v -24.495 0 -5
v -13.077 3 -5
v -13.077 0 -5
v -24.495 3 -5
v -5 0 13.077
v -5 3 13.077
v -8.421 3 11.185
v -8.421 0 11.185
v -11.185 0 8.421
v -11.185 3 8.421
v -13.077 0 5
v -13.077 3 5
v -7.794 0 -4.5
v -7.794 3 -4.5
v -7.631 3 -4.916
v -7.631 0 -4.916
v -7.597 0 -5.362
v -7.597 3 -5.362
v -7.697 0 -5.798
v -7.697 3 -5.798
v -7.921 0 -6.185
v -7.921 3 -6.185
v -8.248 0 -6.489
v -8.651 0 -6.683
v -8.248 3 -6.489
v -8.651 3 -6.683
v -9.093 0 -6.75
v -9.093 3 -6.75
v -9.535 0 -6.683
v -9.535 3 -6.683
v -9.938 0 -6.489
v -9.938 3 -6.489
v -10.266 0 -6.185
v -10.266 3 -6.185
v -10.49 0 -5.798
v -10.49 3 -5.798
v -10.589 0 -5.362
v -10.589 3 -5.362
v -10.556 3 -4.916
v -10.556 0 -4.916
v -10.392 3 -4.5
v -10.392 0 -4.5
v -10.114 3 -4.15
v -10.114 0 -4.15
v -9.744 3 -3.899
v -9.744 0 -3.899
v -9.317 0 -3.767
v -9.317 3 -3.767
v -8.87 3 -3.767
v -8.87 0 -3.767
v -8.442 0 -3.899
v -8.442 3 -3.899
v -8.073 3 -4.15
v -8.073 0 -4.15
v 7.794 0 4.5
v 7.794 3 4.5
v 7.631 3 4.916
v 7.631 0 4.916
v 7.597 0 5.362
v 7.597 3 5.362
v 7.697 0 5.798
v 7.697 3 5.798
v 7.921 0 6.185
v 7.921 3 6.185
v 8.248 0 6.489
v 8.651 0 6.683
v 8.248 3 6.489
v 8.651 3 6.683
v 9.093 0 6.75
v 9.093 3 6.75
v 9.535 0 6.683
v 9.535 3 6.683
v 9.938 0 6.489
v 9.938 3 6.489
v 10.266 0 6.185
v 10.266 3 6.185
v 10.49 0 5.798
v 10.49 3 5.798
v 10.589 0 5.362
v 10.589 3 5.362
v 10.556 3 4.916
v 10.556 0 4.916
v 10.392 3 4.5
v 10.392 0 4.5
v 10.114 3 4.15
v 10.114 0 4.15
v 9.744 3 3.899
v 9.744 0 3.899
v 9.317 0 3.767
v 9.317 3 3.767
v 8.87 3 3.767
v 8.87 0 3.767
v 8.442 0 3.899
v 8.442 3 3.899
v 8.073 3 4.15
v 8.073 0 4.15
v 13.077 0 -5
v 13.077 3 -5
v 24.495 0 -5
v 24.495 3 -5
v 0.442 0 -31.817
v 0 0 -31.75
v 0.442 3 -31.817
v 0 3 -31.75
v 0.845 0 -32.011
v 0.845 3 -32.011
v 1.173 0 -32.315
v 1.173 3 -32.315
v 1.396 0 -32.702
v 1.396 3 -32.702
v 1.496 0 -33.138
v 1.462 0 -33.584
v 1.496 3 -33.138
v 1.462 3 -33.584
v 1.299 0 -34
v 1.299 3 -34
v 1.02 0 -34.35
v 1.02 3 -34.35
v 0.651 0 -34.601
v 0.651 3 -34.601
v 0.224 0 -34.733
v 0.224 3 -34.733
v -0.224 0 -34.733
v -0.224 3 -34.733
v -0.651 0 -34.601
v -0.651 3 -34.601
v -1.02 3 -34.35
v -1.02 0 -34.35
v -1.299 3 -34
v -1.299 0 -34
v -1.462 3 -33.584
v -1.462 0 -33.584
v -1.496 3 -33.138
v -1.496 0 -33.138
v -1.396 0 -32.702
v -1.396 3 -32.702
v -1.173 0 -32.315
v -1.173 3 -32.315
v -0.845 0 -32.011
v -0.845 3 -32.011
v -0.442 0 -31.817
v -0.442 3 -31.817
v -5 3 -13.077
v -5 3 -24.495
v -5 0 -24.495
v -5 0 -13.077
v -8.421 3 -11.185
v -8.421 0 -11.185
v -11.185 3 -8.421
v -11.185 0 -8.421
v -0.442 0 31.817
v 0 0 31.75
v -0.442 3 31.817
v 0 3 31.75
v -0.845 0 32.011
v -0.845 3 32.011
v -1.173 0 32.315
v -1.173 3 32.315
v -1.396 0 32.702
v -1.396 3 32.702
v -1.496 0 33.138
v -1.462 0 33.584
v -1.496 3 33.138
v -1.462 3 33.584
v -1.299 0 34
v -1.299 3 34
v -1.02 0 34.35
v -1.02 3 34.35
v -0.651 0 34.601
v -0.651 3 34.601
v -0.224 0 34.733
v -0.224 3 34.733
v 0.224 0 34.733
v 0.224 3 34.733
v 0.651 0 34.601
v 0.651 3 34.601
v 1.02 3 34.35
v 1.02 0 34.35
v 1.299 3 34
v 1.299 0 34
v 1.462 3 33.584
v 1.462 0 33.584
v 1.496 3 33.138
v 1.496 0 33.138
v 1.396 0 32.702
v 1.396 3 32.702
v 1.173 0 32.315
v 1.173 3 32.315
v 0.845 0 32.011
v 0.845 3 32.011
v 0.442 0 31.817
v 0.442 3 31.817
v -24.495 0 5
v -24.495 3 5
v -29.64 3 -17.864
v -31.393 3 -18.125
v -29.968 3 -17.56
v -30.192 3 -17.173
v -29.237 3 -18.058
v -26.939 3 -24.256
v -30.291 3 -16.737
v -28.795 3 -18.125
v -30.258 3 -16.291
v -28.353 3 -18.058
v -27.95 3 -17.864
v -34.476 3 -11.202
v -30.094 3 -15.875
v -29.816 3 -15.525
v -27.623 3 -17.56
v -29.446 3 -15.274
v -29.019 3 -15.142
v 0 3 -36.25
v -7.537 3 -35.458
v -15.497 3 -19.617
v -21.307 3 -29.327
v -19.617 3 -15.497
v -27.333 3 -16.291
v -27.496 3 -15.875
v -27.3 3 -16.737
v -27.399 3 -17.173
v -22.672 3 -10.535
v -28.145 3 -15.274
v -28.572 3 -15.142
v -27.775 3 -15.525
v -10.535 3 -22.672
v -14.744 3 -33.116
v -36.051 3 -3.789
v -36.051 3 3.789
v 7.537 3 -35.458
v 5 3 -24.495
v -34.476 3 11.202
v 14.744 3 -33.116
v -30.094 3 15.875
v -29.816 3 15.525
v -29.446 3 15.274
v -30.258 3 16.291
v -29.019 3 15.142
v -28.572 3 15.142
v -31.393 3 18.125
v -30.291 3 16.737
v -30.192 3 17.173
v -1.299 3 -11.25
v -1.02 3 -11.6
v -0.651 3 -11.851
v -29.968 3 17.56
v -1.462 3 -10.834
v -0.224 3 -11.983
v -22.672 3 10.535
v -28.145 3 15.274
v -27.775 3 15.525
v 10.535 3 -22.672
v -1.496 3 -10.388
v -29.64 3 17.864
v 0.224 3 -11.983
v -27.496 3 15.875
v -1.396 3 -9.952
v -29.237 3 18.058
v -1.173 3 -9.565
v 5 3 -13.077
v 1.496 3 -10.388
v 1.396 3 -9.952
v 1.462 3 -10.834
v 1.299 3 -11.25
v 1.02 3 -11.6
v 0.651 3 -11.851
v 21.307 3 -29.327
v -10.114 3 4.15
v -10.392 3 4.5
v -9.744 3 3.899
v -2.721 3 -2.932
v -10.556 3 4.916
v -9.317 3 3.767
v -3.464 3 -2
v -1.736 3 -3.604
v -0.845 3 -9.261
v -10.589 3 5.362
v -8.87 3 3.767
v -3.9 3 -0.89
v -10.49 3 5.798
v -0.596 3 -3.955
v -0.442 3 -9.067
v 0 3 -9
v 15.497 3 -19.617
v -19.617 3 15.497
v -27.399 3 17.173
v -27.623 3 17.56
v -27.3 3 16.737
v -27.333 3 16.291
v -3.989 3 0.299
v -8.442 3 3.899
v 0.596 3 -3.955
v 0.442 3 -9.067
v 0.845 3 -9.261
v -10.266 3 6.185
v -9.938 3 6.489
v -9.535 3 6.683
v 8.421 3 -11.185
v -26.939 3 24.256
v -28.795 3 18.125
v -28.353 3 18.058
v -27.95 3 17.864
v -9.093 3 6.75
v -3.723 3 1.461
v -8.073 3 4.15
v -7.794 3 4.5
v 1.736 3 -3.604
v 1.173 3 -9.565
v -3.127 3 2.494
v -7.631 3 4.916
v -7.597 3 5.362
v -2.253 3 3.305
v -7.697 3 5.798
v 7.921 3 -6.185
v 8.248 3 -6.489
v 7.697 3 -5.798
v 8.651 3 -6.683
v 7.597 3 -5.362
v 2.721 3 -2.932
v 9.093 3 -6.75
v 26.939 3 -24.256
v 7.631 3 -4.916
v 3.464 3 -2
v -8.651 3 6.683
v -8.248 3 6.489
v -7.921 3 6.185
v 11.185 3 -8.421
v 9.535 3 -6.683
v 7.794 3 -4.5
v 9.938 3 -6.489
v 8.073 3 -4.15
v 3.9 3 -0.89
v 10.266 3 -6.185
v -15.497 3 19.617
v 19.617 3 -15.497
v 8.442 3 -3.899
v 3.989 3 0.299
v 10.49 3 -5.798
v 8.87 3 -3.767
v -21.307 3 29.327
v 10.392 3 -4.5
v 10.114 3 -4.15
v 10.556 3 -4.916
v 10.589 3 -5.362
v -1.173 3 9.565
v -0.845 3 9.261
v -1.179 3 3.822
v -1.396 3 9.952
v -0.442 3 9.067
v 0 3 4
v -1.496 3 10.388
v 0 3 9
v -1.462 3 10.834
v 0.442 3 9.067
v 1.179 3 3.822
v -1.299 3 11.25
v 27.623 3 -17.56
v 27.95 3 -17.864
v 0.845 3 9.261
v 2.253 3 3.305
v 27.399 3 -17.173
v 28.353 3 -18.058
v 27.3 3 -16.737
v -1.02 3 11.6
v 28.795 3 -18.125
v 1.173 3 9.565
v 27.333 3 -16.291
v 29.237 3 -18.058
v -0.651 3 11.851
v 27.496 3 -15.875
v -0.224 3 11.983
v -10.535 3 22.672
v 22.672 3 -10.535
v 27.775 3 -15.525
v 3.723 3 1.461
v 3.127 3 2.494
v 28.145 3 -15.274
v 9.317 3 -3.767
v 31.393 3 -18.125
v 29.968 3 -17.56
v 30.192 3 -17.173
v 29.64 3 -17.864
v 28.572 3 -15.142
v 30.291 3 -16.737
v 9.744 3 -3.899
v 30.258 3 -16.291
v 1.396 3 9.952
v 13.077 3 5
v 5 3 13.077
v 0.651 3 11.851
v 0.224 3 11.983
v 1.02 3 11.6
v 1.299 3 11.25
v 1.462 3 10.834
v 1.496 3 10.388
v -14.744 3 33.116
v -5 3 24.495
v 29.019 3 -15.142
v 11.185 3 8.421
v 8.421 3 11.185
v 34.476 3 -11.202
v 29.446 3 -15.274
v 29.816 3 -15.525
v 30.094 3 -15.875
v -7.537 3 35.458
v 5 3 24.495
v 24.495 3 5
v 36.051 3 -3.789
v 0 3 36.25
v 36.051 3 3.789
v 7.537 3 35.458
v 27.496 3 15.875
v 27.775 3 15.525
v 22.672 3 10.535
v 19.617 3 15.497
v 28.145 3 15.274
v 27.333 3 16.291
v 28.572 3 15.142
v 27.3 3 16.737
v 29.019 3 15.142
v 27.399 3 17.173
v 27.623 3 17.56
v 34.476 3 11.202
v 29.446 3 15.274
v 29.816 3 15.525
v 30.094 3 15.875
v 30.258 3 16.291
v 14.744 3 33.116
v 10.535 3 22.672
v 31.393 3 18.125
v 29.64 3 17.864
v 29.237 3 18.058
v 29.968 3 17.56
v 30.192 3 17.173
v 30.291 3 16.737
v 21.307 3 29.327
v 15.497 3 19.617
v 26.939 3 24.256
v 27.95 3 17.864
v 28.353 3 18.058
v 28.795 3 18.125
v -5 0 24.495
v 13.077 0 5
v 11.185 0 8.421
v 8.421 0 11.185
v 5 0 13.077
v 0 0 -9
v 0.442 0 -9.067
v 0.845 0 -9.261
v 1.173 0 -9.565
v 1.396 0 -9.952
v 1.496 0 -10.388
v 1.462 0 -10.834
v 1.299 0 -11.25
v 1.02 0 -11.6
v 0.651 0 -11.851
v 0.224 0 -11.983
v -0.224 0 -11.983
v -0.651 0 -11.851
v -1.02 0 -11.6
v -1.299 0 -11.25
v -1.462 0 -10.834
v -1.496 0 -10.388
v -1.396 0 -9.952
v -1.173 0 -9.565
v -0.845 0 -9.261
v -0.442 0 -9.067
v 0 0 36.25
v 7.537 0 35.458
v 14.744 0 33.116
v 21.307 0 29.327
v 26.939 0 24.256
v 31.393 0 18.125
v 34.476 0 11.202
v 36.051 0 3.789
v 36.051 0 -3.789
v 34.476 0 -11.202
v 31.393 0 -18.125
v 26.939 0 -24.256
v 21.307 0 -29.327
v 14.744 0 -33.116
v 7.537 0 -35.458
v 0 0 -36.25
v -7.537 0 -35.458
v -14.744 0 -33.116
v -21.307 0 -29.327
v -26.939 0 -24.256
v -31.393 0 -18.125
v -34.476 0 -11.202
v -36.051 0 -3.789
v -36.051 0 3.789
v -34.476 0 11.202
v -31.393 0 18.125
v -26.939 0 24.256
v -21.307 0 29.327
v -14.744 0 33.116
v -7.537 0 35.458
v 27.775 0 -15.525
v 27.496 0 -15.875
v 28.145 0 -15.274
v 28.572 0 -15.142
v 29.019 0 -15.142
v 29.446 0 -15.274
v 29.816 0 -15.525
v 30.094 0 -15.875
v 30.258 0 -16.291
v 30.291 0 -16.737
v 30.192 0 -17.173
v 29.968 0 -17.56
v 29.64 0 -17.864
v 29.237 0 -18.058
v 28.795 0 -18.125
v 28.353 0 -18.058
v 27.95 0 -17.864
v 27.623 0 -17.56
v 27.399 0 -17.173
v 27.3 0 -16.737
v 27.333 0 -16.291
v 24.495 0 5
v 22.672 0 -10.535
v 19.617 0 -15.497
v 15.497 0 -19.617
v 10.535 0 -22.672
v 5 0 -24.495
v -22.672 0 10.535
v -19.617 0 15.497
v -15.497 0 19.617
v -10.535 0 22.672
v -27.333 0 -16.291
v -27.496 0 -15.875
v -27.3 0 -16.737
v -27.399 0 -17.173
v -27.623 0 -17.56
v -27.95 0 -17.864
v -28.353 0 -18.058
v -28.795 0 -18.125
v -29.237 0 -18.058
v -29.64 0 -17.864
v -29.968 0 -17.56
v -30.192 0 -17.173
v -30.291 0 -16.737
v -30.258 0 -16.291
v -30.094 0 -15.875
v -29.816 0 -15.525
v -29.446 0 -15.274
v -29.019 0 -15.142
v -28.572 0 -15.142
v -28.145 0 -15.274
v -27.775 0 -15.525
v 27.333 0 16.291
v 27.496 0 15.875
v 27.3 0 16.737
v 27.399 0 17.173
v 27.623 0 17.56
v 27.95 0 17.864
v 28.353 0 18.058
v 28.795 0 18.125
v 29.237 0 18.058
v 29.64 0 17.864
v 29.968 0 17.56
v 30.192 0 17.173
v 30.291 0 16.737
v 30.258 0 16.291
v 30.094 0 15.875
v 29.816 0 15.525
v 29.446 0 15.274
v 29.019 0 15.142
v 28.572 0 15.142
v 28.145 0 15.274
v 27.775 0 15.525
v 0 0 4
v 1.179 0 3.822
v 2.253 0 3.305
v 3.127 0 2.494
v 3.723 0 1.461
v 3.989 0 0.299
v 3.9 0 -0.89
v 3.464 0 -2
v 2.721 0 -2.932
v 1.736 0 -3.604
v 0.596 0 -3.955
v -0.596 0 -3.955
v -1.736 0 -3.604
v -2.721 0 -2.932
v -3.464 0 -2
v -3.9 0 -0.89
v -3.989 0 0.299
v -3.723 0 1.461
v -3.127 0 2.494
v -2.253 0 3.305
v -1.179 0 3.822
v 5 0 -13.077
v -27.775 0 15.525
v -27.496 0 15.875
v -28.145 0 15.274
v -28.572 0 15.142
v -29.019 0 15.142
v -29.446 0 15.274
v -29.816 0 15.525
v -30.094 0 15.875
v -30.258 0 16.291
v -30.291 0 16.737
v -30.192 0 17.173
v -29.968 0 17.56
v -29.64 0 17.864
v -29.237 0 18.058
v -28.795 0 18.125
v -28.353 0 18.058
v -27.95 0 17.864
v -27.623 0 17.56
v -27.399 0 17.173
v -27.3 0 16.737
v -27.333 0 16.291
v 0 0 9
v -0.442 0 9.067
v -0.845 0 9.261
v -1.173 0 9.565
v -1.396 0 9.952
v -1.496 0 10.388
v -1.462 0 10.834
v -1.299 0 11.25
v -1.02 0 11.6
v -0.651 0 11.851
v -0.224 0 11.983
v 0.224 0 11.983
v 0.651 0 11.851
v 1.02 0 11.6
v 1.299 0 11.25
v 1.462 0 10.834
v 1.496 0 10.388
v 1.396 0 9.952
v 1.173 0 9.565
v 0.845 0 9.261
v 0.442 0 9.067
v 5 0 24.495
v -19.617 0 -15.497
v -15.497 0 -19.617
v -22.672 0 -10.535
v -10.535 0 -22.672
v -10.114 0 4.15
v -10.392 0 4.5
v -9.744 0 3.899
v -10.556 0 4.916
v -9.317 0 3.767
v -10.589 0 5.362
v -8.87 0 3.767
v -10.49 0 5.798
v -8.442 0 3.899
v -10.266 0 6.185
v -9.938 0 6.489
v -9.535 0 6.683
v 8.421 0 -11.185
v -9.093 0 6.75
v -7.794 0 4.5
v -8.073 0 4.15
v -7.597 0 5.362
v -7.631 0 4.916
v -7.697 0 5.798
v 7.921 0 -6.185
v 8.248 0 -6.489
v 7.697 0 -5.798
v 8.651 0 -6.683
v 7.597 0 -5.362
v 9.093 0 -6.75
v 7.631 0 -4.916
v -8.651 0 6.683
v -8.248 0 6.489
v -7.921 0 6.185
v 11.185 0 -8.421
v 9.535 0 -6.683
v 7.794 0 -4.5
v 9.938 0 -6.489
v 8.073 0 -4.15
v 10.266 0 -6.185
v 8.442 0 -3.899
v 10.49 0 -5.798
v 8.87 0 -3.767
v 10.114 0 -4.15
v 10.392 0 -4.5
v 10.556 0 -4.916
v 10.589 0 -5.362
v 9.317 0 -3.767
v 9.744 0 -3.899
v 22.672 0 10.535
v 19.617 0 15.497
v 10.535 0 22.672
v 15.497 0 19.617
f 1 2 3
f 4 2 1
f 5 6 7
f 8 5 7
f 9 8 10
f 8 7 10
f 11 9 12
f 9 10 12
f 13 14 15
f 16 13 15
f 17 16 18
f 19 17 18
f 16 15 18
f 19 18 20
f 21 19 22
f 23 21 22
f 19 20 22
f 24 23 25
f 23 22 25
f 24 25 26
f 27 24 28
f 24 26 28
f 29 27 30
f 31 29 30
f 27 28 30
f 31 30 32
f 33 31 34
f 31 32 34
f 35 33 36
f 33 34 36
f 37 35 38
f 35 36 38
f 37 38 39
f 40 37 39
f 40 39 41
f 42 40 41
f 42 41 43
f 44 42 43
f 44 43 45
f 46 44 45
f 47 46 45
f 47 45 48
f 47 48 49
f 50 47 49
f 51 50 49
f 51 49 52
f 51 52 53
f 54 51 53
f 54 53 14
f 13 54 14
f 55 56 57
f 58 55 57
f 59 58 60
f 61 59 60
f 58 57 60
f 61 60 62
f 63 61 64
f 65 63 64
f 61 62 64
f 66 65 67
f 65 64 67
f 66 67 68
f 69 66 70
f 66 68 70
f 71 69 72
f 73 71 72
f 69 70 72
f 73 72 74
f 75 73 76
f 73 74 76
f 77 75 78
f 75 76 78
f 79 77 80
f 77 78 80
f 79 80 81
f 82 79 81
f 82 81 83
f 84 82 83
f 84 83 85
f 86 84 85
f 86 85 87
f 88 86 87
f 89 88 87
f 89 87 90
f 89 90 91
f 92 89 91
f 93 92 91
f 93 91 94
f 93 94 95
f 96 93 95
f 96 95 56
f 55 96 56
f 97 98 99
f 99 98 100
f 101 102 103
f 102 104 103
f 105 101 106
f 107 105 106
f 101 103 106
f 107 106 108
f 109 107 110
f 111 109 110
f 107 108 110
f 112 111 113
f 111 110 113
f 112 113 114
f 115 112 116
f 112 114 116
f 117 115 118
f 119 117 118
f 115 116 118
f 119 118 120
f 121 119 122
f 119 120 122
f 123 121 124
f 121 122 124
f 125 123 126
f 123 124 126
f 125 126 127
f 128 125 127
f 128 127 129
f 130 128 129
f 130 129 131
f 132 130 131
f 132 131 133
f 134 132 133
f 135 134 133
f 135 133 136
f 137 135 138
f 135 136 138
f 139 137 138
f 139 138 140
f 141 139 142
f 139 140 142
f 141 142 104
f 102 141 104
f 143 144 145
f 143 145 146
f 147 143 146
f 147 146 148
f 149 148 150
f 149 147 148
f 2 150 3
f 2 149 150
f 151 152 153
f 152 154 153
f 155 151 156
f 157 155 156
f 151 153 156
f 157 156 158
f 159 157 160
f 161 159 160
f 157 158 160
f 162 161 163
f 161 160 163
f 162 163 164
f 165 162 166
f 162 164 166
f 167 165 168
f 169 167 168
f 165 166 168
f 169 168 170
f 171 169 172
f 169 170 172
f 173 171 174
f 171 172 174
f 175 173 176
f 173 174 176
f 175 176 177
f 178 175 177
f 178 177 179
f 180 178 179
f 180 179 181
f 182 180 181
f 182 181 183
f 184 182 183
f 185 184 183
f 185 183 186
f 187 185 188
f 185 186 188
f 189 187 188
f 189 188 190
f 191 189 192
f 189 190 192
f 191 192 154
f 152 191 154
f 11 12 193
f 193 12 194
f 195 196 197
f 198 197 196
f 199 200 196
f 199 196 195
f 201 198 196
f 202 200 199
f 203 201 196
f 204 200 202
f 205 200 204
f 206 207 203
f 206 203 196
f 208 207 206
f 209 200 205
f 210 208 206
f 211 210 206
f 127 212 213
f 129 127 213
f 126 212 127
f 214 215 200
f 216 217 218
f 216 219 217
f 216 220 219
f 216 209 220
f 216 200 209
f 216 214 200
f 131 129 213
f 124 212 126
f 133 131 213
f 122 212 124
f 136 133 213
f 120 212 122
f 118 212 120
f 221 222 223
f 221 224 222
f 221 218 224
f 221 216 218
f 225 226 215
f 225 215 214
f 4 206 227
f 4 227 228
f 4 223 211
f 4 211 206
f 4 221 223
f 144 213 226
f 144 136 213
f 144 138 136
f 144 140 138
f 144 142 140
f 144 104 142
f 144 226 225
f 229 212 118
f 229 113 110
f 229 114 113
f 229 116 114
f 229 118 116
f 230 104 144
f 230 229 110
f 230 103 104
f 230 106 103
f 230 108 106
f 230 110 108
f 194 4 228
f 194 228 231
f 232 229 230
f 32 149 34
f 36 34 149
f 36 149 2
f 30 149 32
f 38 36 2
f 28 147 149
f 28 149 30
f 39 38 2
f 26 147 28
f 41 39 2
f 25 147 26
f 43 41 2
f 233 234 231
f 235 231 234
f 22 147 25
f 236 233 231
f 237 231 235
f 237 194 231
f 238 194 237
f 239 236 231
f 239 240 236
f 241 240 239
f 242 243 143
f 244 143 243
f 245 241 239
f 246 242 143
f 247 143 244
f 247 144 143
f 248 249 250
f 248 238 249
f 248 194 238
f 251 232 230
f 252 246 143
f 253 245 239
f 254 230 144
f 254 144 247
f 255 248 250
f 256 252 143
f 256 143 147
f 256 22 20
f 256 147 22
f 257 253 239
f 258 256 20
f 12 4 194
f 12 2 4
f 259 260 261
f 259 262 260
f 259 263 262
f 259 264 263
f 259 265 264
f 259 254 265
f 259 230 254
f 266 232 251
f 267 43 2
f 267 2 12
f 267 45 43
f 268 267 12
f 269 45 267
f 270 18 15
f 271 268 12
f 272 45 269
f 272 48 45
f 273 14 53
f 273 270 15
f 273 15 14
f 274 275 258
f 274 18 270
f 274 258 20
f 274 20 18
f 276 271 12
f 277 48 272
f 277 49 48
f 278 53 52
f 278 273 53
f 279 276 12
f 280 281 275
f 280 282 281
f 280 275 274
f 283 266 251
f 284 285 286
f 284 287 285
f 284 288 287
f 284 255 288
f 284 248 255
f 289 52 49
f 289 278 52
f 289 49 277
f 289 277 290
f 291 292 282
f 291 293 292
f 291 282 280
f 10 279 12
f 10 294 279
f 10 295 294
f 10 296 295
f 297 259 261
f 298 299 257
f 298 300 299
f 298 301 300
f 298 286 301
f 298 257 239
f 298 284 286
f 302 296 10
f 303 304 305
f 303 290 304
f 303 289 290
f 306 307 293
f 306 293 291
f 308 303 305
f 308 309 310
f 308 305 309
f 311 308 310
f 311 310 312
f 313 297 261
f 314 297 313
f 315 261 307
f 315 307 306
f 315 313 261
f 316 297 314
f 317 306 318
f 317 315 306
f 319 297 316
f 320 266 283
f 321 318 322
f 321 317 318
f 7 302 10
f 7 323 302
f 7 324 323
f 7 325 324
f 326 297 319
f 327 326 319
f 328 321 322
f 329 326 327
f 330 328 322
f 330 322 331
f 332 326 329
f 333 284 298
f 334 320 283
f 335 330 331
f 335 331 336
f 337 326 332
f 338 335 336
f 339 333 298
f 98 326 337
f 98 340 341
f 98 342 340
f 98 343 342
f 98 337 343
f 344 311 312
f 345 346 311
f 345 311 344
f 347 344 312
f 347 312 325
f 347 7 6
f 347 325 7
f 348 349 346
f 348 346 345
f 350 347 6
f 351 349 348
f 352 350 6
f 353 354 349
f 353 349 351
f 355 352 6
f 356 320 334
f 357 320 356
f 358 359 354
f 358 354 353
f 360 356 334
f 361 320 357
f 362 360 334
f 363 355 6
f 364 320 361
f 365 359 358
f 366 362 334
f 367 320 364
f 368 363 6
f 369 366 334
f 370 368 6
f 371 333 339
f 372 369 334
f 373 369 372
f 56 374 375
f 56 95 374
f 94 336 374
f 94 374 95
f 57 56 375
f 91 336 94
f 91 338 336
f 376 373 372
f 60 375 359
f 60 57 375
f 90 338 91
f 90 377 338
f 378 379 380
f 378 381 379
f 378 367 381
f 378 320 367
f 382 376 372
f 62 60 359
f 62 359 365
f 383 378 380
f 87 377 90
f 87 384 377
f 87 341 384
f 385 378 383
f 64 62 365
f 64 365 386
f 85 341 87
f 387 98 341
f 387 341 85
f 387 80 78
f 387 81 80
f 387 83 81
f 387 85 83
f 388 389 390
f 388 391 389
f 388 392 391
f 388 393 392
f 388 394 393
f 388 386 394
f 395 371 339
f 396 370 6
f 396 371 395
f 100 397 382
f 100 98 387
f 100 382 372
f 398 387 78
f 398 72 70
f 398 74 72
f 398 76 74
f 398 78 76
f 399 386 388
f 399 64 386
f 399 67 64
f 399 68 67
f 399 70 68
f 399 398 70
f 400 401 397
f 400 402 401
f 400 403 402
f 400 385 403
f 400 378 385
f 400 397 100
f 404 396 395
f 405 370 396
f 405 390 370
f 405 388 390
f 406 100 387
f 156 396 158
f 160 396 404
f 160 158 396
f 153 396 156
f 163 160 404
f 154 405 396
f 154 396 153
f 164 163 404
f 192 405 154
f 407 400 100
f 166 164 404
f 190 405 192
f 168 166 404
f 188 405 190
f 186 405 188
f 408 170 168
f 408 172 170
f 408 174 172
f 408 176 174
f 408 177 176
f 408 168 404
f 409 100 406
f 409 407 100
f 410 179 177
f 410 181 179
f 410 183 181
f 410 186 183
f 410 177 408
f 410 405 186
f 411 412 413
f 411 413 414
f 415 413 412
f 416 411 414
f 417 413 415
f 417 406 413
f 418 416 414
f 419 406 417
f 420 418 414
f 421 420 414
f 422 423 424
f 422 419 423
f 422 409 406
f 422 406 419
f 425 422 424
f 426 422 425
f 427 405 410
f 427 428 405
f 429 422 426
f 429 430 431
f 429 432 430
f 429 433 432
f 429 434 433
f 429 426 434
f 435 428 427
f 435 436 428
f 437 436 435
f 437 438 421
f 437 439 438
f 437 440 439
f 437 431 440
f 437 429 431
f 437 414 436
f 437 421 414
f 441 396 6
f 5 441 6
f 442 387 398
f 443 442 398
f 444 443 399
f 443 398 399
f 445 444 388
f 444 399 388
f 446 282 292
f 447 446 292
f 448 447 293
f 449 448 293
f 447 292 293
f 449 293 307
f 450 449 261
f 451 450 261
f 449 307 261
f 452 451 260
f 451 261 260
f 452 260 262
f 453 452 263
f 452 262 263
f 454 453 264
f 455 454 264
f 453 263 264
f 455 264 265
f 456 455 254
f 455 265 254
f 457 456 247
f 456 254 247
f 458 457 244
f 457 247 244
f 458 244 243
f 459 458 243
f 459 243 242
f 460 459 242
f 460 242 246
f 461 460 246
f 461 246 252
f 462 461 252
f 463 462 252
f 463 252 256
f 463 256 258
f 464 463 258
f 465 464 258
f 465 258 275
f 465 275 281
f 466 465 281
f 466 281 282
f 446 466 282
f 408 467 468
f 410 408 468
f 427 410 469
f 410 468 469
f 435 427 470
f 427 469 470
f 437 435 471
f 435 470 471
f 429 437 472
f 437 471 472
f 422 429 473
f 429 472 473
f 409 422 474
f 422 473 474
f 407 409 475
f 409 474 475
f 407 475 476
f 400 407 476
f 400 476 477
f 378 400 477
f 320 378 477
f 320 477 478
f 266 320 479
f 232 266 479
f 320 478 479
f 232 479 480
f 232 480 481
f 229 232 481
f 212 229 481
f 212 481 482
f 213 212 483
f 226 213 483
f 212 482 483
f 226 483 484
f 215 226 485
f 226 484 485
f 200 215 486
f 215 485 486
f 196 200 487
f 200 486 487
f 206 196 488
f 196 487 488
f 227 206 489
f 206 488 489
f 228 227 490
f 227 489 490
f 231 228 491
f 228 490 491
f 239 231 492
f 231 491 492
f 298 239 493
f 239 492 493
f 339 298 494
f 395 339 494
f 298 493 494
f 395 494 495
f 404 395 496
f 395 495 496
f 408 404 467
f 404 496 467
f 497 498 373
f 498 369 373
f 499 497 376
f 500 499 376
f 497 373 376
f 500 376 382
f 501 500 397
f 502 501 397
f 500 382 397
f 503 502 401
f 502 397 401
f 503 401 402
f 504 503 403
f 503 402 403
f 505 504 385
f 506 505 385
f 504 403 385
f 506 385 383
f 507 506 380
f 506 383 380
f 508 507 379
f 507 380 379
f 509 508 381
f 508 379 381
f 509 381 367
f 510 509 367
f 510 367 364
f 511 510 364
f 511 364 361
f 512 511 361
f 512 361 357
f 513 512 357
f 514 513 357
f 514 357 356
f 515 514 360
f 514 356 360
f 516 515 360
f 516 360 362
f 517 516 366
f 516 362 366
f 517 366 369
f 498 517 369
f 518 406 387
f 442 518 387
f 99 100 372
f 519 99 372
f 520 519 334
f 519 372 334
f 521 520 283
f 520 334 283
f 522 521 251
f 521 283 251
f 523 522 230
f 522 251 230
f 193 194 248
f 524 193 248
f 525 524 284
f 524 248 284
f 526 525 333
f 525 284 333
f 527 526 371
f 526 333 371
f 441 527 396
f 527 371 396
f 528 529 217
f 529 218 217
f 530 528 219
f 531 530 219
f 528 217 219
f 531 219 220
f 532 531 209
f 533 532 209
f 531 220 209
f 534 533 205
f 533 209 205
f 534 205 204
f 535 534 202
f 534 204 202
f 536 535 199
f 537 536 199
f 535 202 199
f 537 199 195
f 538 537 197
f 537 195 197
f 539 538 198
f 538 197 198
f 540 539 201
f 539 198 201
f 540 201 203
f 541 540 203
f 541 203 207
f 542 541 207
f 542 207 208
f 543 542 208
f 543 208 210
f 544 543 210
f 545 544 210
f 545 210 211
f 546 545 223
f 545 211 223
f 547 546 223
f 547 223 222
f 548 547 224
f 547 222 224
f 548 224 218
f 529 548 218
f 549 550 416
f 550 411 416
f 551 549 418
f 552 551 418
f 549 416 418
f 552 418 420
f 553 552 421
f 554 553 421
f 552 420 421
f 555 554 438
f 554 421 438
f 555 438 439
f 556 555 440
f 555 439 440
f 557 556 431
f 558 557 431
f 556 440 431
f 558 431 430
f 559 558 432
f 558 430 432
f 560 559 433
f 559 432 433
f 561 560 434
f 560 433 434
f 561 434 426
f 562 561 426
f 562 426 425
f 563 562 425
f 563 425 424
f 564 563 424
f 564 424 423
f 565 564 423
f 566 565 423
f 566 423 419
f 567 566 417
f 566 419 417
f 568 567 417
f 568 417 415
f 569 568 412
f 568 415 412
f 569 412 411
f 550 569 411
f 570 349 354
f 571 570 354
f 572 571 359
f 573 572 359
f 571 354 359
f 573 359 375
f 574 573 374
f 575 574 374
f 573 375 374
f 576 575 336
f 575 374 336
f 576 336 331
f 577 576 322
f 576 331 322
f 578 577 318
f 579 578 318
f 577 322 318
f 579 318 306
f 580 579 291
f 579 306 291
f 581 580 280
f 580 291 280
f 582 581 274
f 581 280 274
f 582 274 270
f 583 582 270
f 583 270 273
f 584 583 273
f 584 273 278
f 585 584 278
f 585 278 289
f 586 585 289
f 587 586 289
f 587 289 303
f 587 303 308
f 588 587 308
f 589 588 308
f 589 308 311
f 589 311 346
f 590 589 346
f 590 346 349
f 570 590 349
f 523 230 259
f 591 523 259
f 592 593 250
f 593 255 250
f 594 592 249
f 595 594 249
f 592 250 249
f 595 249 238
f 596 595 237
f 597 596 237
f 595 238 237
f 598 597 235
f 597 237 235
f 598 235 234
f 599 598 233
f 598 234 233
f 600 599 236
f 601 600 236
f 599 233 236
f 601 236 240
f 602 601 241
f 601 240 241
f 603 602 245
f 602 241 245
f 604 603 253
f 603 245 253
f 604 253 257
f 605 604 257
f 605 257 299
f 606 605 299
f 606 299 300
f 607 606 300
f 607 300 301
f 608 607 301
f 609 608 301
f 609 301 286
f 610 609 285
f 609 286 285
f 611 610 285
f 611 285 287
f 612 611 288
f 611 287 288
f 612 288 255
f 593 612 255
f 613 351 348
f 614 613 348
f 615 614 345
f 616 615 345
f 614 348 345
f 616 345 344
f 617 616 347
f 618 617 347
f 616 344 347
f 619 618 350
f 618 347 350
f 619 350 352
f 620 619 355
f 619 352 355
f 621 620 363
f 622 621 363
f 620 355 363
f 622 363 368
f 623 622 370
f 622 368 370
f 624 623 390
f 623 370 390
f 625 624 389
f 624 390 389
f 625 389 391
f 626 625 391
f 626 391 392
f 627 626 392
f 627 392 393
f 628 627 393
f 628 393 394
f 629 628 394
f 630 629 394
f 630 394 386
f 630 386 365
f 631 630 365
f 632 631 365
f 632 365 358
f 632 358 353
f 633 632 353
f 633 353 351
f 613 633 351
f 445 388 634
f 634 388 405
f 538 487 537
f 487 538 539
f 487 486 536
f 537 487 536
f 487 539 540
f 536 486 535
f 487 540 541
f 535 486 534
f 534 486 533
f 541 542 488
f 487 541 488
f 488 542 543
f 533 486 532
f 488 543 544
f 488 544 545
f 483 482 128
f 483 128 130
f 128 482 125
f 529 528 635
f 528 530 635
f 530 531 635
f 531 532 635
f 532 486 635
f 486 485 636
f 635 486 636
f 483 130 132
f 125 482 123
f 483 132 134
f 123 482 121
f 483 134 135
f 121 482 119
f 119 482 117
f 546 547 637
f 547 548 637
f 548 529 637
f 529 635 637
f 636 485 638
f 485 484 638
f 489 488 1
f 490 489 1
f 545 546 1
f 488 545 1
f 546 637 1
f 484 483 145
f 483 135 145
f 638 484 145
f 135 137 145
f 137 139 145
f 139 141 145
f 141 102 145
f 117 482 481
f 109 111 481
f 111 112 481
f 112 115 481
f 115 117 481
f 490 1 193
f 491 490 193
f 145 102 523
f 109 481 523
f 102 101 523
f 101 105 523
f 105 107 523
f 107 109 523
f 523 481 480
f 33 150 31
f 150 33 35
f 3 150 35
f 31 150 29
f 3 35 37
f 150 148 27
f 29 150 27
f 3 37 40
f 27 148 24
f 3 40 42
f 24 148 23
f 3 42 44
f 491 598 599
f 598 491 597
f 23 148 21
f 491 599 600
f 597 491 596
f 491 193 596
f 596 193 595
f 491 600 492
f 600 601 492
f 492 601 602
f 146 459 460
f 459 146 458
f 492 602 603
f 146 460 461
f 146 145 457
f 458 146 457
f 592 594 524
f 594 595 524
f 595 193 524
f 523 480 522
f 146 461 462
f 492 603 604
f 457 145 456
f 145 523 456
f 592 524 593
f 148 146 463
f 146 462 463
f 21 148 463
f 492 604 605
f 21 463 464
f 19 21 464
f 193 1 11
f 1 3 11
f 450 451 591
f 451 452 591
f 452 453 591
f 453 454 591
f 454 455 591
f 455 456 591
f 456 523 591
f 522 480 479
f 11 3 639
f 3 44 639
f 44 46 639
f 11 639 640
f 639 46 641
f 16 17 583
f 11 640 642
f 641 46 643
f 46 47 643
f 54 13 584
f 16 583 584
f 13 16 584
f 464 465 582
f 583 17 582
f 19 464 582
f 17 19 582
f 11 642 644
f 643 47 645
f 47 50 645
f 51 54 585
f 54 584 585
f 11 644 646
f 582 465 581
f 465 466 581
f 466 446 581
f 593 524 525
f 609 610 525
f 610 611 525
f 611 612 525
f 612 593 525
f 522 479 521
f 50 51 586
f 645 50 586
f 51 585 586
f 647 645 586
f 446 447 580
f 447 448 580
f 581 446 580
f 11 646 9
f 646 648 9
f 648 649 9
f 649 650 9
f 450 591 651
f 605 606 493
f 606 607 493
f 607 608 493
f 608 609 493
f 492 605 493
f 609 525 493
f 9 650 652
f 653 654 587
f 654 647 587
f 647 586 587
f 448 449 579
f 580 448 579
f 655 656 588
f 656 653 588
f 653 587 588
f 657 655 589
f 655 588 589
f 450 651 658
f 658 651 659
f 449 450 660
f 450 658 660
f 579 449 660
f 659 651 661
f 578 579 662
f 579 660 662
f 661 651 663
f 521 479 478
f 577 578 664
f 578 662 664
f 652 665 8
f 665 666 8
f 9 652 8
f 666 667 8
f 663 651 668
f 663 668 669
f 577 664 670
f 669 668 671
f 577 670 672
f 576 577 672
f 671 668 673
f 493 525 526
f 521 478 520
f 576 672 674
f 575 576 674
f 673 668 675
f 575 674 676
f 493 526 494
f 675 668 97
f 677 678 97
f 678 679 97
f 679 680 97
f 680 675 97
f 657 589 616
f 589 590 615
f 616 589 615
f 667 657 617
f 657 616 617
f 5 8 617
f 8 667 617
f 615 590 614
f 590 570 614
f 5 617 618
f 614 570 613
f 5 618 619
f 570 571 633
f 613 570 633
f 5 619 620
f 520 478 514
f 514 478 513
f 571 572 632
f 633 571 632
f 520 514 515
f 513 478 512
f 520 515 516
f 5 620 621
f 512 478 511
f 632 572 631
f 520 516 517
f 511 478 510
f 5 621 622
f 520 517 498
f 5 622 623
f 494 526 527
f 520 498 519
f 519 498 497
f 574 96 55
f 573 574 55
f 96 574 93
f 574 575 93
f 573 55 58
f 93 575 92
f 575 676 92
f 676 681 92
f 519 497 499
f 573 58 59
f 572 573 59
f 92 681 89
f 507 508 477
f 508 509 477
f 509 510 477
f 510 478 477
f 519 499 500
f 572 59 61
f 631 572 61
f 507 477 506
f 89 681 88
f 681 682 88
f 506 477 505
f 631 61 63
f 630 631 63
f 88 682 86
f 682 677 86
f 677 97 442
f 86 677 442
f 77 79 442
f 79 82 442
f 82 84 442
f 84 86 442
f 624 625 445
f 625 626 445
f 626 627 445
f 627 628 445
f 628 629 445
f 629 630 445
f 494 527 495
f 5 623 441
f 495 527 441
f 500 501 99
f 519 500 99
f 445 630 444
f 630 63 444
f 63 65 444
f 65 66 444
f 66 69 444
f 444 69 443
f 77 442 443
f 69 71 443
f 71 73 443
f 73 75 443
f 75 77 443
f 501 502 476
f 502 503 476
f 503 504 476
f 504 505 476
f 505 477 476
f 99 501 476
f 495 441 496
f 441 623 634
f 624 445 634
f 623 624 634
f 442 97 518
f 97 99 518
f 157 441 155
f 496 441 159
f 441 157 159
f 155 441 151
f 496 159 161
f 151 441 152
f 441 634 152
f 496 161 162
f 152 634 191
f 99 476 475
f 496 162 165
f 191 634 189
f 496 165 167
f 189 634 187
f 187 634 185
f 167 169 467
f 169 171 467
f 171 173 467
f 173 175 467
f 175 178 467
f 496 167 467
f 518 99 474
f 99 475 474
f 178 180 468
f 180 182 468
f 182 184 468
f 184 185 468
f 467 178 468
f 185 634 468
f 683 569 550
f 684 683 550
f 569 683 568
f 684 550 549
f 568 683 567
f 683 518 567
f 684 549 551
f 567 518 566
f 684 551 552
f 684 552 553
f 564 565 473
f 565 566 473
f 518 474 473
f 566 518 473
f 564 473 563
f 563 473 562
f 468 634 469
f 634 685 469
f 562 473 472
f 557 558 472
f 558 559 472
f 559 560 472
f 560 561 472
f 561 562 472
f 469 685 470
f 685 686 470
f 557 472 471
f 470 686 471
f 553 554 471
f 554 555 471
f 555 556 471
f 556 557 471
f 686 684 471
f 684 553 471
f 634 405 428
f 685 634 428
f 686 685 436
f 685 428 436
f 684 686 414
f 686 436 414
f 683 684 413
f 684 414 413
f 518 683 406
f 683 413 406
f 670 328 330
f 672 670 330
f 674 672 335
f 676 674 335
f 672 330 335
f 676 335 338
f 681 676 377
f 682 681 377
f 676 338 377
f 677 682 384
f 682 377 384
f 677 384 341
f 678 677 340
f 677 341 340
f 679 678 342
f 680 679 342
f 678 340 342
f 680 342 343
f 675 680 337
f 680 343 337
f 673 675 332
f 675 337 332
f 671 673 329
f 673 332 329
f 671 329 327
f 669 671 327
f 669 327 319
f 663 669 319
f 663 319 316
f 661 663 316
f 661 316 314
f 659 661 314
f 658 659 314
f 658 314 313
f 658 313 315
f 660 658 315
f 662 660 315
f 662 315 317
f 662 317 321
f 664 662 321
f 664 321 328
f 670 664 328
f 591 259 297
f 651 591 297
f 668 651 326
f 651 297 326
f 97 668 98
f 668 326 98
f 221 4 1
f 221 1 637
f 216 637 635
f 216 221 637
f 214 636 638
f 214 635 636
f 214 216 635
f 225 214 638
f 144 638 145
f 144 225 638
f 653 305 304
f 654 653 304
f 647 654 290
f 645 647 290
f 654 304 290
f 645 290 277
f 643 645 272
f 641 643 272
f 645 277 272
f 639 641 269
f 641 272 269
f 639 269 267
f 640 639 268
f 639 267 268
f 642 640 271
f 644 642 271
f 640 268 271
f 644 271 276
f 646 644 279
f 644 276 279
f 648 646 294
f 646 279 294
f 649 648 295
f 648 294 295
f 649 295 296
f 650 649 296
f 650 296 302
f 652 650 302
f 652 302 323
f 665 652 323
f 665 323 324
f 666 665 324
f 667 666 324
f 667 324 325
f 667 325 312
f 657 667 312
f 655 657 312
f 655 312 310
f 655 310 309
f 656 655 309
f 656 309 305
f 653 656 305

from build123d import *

# Parameters (mm, degrees)
SKETCH1_R           = 36.25
BOSS_EXTRUDE1_DEPTH = 3
SKETCH2_R           = 1.5
CUT_EXTRUDE1_DEPTH  = 52.352945388
SKETCH3_R           = 4
CUT_EXTRUDE2_DEPTH  = 8
CIRPATTERN1_COUNT   = 6
SKETCH4_R           = 1.5
CUT_EXTRUDE3_DEPTH  = 52.352945388
CIRPATTERN2_COUNT   = 6


with BuildPart() as part:
    # Sketch1 → Boss-Extrude1 (new body)
    with BuildSketch(Plane(origin=(0, 0, 0), x_dir=(1, 0, 0), z_dir=(0, 1, 0))):
        Circle(SKETCH1_R)
    extrude(amount=BOSS_EXTRUDE1_DEPTH)

    # Sketch2 → Cut-Extrude1 (cut, symmetric)
    with BuildSketch(Plane(origin=(0, 3, 0), x_dir=(1, 0, 0), z_dir=(0, 1, 0))):
        with Locations((0, 33.25)):
            Circle(SKETCH2_R)
    cut_extrude1 = extrude(amount=CUT_EXTRUDE1_DEPTH, both=True, mode=Mode.SUBTRACT)

    # Sketch3 → Cut-Extrude2 (cut)
    with BuildSketch(Plane(origin=(0, 3, 0), x_dir=(1, 0, 0), z_dir=(0, 1, 0))):
        with BuildLine():
            Line((-5, 13.076696831), (-5, 24.494897428))
            ThreePointArc((-5, 24.494897428), (-17.67766953, 17.67766953), (-24.494897428, 5))
            Line((-24.494897428, 5), (-13.076696831, 5))
            ThreePointArc((-13.076696831, 5), (-9.899494937, 9.899494937), (-5, 13.076696831))
        make_face()
        with BuildLine():
            ThreePointArc((24.494897428, 5), (17.67766953, 17.67766953), (5, 24.494897428))
            Line((5, 24.494897428), (5, 13.076696831))
            ThreePointArc((5, 13.076696831), (9.899494937, 9.899494937), (13.076696831, 5))
            Line((13.076696831, 5), (24.494897428, 5))
        make_face()
        with BuildLine():
            ThreePointArc((5, -24.494897428), (17.67766953, -17.67766953), (24.494897428, -5))
            Line((24.494897428, -5), (13.076696831, -5))
            ThreePointArc((13.076696831, -5), (9.899494937, -9.899494937), (5, -13.076696831))
            Line((5, -13.076696831), (5, -24.494897428))
        make_face()
        with BuildLine():
            ThreePointArc((-24.494897428, -5), (-17.67766953, -17.67766953), (-5, -24.494897428))
            Line((-5, -24.494897428), (-5, -13.076696831))
            ThreePointArc((-5, -13.076696831), (-9.899494937, -9.899494937), (-13.076696831, -5))
            Line((-13.076696831, -5), (-24.494897428, -5))
        make_face()
        Circle(SKETCH3_R)
    extrude(amount=-CUT_EXTRUDE2_DEPTH, mode=Mode.SUBTRACT)

    # CirPattern1: Cut-Extrude1 ×6 about axis
    cirpattern1_axis = Axis((0, 3, 0), (0, -1, 0))
    for i in range(1, CIRPATTERN1_COUNT):
        add(cut_extrude1.rotate(cirpattern1_axis, i * 360 / CIRPATTERN1_COUNT), mode=Mode.SUBTRACT)

    # Sketch4 → Cut-Extrude3 (cut, through all)
    with BuildSketch(Plane(origin=(0, 3, 0), x_dir=(1, 0, 0), z_dir=(0, 1, 0))):
        with Locations((0, 10.5)):
            Circle(SKETCH4_R)
    cut_extrude3 = extrude(amount=-CUT_EXTRUDE3_DEPTH, mode=Mode.SUBTRACT)

    # CirPattern2: Cut-Extrude3 ×6 about axis
    cirpattern2_axis = Axis((0, 3, 0), (0, -1, 0))
    for i in range(1, CIRPATTERN2_COUNT):
        add(cut_extrude3.rotate(cirpattern2_axis, i * 360 / CIRPATTERN2_COUNT), mode=Mode.SUBTRACT)


solid = part.part
